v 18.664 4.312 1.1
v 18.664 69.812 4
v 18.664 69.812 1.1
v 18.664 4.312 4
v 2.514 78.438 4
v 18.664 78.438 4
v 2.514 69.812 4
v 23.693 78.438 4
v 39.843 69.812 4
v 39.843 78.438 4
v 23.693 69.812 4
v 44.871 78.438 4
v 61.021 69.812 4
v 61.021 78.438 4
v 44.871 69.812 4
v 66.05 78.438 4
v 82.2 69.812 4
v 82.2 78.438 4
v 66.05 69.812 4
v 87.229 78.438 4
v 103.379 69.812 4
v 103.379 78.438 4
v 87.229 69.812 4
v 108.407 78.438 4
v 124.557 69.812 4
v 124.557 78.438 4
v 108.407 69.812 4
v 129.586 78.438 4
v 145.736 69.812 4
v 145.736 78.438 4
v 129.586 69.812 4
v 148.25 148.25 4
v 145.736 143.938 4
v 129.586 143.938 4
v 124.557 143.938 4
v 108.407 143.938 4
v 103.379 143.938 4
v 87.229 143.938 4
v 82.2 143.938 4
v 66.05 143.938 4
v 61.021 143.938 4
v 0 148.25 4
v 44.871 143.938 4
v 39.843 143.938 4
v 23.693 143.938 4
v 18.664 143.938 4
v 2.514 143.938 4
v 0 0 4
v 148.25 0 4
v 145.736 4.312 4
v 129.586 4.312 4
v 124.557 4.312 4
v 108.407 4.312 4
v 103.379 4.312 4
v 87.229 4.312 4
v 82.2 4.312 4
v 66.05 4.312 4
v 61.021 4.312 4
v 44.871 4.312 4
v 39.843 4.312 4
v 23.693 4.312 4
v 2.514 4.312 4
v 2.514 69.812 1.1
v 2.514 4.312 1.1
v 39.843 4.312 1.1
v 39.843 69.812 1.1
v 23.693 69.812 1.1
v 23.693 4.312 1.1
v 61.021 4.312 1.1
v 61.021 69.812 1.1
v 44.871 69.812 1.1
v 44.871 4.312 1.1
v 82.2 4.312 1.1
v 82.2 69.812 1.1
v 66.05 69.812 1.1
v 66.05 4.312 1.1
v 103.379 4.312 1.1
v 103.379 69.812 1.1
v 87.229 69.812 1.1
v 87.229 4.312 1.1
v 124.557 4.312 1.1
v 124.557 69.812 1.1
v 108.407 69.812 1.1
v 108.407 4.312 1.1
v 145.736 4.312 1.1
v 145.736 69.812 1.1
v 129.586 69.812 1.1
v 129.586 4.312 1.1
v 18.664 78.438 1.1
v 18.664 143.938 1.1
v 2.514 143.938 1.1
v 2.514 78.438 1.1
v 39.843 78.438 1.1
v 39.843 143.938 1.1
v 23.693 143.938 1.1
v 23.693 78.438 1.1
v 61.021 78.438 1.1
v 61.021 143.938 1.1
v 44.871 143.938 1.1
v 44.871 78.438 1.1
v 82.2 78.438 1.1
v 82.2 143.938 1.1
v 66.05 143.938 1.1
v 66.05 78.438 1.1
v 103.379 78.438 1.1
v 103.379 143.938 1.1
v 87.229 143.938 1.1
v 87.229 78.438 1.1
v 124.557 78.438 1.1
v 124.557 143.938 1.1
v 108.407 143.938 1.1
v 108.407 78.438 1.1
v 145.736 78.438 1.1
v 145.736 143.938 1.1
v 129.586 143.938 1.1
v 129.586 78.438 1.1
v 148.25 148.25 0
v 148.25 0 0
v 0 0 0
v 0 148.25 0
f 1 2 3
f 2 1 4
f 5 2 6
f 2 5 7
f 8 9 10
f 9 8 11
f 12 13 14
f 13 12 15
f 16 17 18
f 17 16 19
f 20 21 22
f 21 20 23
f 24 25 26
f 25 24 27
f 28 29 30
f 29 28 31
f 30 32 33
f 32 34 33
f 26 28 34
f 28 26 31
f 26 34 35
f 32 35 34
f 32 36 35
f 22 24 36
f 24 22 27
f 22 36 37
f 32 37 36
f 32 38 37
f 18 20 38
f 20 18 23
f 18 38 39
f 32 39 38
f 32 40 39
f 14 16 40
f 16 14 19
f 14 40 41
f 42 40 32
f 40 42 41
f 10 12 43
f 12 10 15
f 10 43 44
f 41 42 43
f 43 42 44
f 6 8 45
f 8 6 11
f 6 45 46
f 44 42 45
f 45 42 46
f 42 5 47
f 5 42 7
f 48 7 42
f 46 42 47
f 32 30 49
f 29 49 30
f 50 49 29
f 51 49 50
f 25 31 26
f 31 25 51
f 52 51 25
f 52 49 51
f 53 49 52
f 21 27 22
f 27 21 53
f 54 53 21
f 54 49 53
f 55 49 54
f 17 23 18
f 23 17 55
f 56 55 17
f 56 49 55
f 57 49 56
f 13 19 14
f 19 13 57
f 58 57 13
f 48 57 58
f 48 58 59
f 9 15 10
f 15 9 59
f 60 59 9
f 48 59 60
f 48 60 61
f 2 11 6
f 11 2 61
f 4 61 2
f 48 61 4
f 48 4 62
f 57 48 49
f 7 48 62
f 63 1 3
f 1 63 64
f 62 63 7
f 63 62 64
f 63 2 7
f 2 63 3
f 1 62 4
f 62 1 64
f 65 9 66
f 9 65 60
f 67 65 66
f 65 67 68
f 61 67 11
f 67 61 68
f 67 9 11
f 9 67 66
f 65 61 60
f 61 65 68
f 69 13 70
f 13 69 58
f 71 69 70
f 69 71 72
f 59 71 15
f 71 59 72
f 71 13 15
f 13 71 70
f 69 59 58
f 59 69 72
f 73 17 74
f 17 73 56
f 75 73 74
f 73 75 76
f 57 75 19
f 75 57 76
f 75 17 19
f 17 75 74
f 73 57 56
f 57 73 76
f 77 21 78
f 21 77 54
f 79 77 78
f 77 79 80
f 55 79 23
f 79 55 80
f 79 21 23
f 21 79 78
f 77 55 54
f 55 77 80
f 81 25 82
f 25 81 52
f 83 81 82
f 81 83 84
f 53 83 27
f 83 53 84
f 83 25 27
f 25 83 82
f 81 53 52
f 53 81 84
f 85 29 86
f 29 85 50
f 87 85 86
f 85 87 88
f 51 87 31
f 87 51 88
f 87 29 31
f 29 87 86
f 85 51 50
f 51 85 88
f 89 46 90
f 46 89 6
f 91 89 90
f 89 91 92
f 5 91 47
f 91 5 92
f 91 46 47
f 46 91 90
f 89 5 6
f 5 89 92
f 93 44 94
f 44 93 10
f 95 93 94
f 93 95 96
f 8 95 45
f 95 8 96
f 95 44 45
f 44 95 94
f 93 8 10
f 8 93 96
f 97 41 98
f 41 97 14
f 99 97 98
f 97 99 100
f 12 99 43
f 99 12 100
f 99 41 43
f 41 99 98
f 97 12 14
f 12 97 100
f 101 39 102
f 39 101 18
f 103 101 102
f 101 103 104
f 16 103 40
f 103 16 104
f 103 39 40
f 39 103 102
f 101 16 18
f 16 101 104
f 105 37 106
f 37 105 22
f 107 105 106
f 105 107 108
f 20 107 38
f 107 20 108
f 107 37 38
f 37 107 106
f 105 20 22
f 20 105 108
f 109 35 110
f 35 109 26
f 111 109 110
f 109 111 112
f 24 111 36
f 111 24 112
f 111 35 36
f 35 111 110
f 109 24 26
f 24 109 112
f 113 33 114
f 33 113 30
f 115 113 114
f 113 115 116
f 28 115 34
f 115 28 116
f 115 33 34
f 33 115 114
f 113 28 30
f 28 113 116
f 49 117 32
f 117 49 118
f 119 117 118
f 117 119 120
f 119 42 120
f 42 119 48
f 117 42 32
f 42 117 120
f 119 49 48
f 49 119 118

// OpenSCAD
item_width = 16.15;
item_length = 65.5;
item_depth = 2.9;

jig_width = 148.25;
jig_length = 148.25;
jig_depth = 4;

mold_area_width = jig_width / 7;
mold_area_length = jig_length / 2;

difference() {
    // Jig
    cube([
        jig_width,
        jig_length,
        jig_depth
    ]);

    // Items
    for (j = [0:2]) {
        for (i = [0:6]) {
            translate([
                mold_area_width * i + 1/2 * (mold_area_width - item_width),
                mold_area_length * j + 1/2 * (mold_area_length - item_length),
                jig_depth - item_depth
            ]) {
                cube([
                    item_width,
                    item_length,
                    item_depth
                ]);
            }
        }
    }
}
